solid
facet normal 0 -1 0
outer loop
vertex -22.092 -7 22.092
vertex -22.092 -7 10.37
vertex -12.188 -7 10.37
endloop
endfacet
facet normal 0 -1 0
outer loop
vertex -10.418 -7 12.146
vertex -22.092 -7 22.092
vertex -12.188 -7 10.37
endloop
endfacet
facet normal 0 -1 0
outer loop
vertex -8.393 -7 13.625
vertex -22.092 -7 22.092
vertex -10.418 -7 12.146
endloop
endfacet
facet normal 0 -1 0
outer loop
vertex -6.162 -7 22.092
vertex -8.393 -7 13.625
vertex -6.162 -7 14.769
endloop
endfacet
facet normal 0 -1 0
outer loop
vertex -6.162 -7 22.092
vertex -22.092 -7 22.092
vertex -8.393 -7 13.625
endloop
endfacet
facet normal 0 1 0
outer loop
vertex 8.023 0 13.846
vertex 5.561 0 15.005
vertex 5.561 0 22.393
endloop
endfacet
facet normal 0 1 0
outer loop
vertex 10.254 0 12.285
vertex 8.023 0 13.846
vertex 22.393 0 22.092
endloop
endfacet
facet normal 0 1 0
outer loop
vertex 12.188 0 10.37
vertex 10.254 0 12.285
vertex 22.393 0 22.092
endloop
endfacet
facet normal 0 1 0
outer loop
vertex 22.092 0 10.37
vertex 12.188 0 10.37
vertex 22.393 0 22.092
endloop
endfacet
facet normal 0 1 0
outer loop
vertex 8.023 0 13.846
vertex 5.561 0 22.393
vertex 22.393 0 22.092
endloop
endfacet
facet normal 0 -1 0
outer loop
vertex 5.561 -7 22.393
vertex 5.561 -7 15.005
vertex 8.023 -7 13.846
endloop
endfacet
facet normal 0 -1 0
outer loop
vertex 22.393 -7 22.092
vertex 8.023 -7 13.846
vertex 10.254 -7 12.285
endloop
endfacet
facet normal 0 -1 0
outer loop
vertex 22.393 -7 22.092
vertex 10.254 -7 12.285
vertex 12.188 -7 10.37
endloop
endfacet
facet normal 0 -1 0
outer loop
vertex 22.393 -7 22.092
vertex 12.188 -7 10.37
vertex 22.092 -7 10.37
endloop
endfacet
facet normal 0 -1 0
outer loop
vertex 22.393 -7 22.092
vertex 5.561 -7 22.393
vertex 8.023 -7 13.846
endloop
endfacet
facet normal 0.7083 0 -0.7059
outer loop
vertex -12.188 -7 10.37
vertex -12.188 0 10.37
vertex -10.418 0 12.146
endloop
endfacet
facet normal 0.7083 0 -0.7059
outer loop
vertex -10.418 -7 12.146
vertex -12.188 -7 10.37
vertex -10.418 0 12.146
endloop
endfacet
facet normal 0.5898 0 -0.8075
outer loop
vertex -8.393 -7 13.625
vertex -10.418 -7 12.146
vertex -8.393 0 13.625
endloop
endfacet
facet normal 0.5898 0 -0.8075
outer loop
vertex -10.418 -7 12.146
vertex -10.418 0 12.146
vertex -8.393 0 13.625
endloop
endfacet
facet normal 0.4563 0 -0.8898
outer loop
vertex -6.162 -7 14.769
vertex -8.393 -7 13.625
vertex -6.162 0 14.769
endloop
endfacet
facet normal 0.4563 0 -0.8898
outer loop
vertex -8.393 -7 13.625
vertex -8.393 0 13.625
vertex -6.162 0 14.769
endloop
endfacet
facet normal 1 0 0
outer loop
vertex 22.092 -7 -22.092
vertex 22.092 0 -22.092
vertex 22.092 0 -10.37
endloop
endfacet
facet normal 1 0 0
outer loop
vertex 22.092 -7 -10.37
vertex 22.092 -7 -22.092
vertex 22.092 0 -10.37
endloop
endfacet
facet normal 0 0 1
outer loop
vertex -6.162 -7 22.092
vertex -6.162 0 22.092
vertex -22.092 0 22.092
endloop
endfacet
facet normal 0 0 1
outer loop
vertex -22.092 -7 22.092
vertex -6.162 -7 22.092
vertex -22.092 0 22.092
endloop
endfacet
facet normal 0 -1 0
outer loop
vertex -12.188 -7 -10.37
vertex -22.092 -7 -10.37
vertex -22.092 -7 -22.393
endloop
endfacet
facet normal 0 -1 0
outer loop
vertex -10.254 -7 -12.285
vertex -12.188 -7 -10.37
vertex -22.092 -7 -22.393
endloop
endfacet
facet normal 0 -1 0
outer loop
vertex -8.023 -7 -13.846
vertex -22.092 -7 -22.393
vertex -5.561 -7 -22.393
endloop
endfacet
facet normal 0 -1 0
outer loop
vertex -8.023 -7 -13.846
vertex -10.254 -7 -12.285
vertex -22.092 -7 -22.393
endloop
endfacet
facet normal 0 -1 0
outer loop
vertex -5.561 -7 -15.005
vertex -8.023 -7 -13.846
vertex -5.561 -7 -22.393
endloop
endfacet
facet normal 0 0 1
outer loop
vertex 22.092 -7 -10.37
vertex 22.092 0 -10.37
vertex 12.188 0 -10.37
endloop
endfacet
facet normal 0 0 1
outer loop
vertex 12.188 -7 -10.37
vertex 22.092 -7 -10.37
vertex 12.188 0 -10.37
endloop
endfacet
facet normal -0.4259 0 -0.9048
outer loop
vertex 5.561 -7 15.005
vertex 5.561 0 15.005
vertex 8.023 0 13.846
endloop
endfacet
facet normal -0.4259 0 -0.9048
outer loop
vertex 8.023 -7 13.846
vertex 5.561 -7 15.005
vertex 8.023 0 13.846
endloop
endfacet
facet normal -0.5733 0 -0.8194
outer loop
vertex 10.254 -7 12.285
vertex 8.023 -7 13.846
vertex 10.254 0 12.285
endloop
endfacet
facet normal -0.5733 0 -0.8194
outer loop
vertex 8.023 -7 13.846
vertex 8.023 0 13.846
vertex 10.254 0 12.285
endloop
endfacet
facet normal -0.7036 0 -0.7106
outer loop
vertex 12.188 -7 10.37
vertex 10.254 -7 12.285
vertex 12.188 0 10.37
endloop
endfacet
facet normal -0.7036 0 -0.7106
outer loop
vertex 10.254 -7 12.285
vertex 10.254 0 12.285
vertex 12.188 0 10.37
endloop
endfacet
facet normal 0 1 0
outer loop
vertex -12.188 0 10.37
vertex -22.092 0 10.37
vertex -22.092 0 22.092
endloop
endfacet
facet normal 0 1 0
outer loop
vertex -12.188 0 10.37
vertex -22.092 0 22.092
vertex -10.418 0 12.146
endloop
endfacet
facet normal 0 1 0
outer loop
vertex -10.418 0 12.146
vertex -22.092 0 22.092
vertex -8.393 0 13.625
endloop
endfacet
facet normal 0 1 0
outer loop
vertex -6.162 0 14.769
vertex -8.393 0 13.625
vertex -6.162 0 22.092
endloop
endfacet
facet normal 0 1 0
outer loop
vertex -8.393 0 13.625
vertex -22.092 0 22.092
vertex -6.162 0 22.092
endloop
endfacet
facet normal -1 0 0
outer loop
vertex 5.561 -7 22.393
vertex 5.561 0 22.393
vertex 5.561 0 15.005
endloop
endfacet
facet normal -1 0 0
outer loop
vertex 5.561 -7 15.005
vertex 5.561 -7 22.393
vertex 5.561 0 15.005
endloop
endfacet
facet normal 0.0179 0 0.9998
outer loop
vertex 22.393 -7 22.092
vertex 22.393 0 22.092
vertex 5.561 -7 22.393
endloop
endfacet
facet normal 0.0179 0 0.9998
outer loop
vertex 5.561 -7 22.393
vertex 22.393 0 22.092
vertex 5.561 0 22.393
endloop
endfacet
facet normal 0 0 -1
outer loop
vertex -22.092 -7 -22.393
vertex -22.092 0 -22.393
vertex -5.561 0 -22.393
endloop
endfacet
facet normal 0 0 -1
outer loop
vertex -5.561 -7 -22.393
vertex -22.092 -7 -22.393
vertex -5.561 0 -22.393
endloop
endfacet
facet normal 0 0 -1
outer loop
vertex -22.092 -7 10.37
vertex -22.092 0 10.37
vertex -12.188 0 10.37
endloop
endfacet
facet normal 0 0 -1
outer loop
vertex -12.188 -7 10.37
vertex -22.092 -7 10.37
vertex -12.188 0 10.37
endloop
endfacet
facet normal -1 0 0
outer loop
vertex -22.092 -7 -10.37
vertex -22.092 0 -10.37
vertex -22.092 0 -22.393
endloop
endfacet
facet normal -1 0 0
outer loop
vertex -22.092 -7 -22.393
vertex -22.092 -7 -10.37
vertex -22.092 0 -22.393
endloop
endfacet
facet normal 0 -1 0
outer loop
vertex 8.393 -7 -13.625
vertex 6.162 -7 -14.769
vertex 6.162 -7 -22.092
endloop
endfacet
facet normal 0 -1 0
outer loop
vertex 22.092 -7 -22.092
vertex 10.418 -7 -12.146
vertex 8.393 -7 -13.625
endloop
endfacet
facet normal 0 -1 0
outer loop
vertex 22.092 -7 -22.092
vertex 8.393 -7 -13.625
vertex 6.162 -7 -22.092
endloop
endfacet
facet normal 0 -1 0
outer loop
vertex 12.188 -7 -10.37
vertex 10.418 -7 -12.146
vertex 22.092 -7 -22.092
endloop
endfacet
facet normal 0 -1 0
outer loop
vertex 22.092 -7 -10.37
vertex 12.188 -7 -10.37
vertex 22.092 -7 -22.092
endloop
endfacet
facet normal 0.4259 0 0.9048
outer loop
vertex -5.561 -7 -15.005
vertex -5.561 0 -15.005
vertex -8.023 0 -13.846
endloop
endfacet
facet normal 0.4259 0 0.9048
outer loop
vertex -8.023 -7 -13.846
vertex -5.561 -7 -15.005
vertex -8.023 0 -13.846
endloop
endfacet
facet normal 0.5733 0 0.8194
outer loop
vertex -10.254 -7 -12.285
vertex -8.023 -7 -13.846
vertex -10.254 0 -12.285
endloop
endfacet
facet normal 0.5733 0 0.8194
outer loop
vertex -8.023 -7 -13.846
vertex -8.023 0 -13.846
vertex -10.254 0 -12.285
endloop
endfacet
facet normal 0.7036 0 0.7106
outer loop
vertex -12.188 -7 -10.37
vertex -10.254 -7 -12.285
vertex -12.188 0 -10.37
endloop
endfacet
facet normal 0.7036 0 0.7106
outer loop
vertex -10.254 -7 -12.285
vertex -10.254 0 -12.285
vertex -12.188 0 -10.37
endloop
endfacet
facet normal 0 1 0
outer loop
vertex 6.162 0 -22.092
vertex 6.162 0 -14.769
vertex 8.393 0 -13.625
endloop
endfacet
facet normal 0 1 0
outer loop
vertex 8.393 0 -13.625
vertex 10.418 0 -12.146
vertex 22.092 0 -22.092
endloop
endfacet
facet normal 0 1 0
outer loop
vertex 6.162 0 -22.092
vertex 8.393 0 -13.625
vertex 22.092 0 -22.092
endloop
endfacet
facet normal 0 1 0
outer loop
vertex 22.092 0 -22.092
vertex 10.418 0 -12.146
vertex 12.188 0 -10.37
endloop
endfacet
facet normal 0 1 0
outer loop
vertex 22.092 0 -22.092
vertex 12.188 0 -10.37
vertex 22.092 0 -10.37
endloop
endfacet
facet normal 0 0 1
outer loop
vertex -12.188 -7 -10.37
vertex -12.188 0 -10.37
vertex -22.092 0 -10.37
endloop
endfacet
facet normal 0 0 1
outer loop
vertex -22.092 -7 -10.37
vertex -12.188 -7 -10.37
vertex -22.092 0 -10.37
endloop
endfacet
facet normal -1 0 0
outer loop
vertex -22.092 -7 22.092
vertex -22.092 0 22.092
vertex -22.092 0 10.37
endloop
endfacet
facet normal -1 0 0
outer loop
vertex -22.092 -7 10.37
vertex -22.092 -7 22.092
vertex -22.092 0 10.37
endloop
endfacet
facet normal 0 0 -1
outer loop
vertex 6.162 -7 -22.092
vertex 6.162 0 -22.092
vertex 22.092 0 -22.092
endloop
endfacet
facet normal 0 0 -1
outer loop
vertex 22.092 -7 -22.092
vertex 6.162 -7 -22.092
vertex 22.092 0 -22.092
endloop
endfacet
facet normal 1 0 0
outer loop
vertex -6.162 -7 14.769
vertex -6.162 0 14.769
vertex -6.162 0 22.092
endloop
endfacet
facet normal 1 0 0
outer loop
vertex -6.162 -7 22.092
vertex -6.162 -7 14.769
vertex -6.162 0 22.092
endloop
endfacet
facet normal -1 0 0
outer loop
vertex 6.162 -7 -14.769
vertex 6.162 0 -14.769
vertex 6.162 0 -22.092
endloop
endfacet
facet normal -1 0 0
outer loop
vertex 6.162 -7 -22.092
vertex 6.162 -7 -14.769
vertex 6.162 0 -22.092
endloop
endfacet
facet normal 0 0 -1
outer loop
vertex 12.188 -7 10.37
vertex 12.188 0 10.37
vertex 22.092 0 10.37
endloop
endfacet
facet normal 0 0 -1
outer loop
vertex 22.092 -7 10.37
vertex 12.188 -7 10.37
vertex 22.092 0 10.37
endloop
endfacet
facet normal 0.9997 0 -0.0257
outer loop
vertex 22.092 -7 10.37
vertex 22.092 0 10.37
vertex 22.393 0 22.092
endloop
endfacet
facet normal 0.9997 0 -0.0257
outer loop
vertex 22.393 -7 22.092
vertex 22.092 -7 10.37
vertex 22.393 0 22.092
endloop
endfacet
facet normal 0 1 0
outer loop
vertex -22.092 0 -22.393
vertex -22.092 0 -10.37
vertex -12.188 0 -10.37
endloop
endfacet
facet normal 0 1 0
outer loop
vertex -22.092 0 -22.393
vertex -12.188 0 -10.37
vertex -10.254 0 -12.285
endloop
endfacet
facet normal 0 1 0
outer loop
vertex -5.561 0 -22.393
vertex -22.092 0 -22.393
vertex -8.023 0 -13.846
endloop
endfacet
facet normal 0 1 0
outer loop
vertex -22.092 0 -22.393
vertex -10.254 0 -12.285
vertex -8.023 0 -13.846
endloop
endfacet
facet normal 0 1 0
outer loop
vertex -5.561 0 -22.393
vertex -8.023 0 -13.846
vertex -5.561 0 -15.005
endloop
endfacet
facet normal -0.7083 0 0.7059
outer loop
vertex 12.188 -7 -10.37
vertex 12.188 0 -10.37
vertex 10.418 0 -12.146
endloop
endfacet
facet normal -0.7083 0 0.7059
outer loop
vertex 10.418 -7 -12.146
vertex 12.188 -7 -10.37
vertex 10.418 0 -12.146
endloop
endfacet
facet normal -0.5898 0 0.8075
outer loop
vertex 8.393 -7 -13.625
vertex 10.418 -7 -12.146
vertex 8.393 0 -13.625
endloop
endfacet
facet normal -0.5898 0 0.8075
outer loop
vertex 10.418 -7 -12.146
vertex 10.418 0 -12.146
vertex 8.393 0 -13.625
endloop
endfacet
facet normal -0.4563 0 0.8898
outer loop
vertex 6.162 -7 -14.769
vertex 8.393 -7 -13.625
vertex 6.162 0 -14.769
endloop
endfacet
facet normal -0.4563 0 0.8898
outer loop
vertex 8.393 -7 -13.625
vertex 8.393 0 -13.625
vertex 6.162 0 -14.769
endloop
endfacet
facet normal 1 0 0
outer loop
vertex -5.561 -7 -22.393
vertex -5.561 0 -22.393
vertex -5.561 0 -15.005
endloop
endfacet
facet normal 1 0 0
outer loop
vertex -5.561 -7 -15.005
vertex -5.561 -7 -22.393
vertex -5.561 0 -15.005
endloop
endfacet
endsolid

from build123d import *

# Parameters (mm, degrees)
F1_DEPTH  = 7
F2_W      = 42.9818704724
F2_H      = 20.7395032048
F6_DEPTH  = 25
F3_W      = 12.3234726489
F3_H      = 22.2423672676
F5_R      = 15.6600886523
F4_W      = 11.1211827025
F4_H      = 21.6412246227
F11_W     = 43.5830168426
F11_H     = 20.1383605599
F12_DEPTH = 8.4


with BuildPart() as f1:
    # F0 (on Front) → F1 (new body)
    with BuildSketch(Plane.XZ):
        with BuildLine():
            ThreePointArc((-12.18802236, 10.3697516024), (-9.434826942, 12.9253115211), (-6.1617363244, 14.7686371345))
            Line((-6.1617363244, 14.7686371345), (-6.1617363244, 22.0920816064))
            Line((-6.1617363244, 22.0920816064), (-22.0920816064, 22.0920816064))
            Line((-22.0920816064, 22.0920816064), (-22.0920816064, 10.3697516024))
            Line((-22.0920816064, 10.3697516024), (-12.18802236, 10.3697516024))
        make_face()
    extrude(amount=F1_DEPTH)


with BuildPart() as f1b:
    # F0 (on Front) → F1, piece 2 (new body)
    with BuildSketch(Plane.XZ):
        with BuildLine():
            ThreePointArc((5.5605913512, 15.0053144308), (9.1719917603, 13.113130995), (12.18802236, 10.3697516024))
            Line((12.18802236, 10.3697516024), (22.0920816064, 10.3697516024))
            Line((22.0920816064, 10.3697516024), (22.3926529288, 22.0920816064))
            Line((22.3926529288, 22.0920816064), (5.5605913512, 22.3926529288))
            Line((5.5605913512, 22.3926529288), (5.5605913512, 15.0053144308))
        make_face()
    extrude(amount=F1_DEPTH)


with BuildPart() as f1c:
    # F0 (on Front) → F1, piece 3 (new body)
    with BuildSketch(Plane.XZ):
        with BuildLine():
            Line((-5.5605913512, -22.3926529288), (-5.5605913512, -15.0053144308))
            ThreePointArc((-5.5605913512, -15.0053144308), (-9.1719917603, -13.113130995), (-12.18802236, -10.3697516024))
            Line((-12.18802236, -10.3697516024), (-22.0920816064, -10.3697516024))
            Line((-22.0920816064, -10.3697516024), (-22.0920816064, -22.3926529288))
            Line((-22.0920816064, -22.3926529288), (-5.5605913512, -22.3926529288))
        make_face()
    extrude(amount=F1_DEPTH)


with BuildPart() as f1d:
    # F0 (on Front) → F1, piece 4 (new body)
    with BuildSketch(Plane.XZ):
        with BuildLine():
            Line((22.0920816064, -10.3697516024), (12.18802236, -10.3697516024))
            ThreePointArc((12.18802236, -10.3697516024), (9.434826942, -12.9253115211), (6.1617363244, -14.7686371345))
            Line((6.1617363244, -14.7686371345), (6.1617363244, -22.0920816064))
            Line((6.1617363244, -22.0920816064), (22.0920816064, -22.0920816064))
            Line((22.0920816064, -22.0920816064), (22.0920816064, -10.3697516024))
        make_face()
    extrude(amount=F1_DEPTH)


with BuildPart() as f6:
    # F2 (on Front) → F6 (new body)
    with BuildSketch(Plane.XZ):
        Rectangle(F2_W, F2_H)
    extrude(amount=F6_DEPTH)


with BuildPart() as f6b:
    # F3 (on Front) → F6, piece 2 (new body)
    with BuildSketch(Plane.XZ):
        with Locations((0, 11.271469295)):
            Rectangle(F3_W, F3_H)
    extrude(amount=F6_DEPTH)


with BuildPart() as f6c:
    # F5 (on Front) → F6, piece 3 (new body)
    with BuildSketch(Plane.XZ):
        Circle(F5_R)
    extrude(amount=F6_DEPTH)


with BuildPart() as f6d:
    # F4 (on Front) → F6, piece 4 (new body)
    with BuildSketch(Plane.XZ):
        with Locations((0, -11.271469295)):
            Rectangle(F4_W, F4_H)
    extrude(amount=F6_DEPTH)


with BuildPart() as f12:
    # F11 (on Front) → F12 (new body)
    with BuildSketch(Plane.XZ):
        Rectangle(F11_W, F11_H)
    extrude(amount=F12_DEPTH)


solid = Compound([f1.part, f1b.part, f1c.part, f1d.part])
